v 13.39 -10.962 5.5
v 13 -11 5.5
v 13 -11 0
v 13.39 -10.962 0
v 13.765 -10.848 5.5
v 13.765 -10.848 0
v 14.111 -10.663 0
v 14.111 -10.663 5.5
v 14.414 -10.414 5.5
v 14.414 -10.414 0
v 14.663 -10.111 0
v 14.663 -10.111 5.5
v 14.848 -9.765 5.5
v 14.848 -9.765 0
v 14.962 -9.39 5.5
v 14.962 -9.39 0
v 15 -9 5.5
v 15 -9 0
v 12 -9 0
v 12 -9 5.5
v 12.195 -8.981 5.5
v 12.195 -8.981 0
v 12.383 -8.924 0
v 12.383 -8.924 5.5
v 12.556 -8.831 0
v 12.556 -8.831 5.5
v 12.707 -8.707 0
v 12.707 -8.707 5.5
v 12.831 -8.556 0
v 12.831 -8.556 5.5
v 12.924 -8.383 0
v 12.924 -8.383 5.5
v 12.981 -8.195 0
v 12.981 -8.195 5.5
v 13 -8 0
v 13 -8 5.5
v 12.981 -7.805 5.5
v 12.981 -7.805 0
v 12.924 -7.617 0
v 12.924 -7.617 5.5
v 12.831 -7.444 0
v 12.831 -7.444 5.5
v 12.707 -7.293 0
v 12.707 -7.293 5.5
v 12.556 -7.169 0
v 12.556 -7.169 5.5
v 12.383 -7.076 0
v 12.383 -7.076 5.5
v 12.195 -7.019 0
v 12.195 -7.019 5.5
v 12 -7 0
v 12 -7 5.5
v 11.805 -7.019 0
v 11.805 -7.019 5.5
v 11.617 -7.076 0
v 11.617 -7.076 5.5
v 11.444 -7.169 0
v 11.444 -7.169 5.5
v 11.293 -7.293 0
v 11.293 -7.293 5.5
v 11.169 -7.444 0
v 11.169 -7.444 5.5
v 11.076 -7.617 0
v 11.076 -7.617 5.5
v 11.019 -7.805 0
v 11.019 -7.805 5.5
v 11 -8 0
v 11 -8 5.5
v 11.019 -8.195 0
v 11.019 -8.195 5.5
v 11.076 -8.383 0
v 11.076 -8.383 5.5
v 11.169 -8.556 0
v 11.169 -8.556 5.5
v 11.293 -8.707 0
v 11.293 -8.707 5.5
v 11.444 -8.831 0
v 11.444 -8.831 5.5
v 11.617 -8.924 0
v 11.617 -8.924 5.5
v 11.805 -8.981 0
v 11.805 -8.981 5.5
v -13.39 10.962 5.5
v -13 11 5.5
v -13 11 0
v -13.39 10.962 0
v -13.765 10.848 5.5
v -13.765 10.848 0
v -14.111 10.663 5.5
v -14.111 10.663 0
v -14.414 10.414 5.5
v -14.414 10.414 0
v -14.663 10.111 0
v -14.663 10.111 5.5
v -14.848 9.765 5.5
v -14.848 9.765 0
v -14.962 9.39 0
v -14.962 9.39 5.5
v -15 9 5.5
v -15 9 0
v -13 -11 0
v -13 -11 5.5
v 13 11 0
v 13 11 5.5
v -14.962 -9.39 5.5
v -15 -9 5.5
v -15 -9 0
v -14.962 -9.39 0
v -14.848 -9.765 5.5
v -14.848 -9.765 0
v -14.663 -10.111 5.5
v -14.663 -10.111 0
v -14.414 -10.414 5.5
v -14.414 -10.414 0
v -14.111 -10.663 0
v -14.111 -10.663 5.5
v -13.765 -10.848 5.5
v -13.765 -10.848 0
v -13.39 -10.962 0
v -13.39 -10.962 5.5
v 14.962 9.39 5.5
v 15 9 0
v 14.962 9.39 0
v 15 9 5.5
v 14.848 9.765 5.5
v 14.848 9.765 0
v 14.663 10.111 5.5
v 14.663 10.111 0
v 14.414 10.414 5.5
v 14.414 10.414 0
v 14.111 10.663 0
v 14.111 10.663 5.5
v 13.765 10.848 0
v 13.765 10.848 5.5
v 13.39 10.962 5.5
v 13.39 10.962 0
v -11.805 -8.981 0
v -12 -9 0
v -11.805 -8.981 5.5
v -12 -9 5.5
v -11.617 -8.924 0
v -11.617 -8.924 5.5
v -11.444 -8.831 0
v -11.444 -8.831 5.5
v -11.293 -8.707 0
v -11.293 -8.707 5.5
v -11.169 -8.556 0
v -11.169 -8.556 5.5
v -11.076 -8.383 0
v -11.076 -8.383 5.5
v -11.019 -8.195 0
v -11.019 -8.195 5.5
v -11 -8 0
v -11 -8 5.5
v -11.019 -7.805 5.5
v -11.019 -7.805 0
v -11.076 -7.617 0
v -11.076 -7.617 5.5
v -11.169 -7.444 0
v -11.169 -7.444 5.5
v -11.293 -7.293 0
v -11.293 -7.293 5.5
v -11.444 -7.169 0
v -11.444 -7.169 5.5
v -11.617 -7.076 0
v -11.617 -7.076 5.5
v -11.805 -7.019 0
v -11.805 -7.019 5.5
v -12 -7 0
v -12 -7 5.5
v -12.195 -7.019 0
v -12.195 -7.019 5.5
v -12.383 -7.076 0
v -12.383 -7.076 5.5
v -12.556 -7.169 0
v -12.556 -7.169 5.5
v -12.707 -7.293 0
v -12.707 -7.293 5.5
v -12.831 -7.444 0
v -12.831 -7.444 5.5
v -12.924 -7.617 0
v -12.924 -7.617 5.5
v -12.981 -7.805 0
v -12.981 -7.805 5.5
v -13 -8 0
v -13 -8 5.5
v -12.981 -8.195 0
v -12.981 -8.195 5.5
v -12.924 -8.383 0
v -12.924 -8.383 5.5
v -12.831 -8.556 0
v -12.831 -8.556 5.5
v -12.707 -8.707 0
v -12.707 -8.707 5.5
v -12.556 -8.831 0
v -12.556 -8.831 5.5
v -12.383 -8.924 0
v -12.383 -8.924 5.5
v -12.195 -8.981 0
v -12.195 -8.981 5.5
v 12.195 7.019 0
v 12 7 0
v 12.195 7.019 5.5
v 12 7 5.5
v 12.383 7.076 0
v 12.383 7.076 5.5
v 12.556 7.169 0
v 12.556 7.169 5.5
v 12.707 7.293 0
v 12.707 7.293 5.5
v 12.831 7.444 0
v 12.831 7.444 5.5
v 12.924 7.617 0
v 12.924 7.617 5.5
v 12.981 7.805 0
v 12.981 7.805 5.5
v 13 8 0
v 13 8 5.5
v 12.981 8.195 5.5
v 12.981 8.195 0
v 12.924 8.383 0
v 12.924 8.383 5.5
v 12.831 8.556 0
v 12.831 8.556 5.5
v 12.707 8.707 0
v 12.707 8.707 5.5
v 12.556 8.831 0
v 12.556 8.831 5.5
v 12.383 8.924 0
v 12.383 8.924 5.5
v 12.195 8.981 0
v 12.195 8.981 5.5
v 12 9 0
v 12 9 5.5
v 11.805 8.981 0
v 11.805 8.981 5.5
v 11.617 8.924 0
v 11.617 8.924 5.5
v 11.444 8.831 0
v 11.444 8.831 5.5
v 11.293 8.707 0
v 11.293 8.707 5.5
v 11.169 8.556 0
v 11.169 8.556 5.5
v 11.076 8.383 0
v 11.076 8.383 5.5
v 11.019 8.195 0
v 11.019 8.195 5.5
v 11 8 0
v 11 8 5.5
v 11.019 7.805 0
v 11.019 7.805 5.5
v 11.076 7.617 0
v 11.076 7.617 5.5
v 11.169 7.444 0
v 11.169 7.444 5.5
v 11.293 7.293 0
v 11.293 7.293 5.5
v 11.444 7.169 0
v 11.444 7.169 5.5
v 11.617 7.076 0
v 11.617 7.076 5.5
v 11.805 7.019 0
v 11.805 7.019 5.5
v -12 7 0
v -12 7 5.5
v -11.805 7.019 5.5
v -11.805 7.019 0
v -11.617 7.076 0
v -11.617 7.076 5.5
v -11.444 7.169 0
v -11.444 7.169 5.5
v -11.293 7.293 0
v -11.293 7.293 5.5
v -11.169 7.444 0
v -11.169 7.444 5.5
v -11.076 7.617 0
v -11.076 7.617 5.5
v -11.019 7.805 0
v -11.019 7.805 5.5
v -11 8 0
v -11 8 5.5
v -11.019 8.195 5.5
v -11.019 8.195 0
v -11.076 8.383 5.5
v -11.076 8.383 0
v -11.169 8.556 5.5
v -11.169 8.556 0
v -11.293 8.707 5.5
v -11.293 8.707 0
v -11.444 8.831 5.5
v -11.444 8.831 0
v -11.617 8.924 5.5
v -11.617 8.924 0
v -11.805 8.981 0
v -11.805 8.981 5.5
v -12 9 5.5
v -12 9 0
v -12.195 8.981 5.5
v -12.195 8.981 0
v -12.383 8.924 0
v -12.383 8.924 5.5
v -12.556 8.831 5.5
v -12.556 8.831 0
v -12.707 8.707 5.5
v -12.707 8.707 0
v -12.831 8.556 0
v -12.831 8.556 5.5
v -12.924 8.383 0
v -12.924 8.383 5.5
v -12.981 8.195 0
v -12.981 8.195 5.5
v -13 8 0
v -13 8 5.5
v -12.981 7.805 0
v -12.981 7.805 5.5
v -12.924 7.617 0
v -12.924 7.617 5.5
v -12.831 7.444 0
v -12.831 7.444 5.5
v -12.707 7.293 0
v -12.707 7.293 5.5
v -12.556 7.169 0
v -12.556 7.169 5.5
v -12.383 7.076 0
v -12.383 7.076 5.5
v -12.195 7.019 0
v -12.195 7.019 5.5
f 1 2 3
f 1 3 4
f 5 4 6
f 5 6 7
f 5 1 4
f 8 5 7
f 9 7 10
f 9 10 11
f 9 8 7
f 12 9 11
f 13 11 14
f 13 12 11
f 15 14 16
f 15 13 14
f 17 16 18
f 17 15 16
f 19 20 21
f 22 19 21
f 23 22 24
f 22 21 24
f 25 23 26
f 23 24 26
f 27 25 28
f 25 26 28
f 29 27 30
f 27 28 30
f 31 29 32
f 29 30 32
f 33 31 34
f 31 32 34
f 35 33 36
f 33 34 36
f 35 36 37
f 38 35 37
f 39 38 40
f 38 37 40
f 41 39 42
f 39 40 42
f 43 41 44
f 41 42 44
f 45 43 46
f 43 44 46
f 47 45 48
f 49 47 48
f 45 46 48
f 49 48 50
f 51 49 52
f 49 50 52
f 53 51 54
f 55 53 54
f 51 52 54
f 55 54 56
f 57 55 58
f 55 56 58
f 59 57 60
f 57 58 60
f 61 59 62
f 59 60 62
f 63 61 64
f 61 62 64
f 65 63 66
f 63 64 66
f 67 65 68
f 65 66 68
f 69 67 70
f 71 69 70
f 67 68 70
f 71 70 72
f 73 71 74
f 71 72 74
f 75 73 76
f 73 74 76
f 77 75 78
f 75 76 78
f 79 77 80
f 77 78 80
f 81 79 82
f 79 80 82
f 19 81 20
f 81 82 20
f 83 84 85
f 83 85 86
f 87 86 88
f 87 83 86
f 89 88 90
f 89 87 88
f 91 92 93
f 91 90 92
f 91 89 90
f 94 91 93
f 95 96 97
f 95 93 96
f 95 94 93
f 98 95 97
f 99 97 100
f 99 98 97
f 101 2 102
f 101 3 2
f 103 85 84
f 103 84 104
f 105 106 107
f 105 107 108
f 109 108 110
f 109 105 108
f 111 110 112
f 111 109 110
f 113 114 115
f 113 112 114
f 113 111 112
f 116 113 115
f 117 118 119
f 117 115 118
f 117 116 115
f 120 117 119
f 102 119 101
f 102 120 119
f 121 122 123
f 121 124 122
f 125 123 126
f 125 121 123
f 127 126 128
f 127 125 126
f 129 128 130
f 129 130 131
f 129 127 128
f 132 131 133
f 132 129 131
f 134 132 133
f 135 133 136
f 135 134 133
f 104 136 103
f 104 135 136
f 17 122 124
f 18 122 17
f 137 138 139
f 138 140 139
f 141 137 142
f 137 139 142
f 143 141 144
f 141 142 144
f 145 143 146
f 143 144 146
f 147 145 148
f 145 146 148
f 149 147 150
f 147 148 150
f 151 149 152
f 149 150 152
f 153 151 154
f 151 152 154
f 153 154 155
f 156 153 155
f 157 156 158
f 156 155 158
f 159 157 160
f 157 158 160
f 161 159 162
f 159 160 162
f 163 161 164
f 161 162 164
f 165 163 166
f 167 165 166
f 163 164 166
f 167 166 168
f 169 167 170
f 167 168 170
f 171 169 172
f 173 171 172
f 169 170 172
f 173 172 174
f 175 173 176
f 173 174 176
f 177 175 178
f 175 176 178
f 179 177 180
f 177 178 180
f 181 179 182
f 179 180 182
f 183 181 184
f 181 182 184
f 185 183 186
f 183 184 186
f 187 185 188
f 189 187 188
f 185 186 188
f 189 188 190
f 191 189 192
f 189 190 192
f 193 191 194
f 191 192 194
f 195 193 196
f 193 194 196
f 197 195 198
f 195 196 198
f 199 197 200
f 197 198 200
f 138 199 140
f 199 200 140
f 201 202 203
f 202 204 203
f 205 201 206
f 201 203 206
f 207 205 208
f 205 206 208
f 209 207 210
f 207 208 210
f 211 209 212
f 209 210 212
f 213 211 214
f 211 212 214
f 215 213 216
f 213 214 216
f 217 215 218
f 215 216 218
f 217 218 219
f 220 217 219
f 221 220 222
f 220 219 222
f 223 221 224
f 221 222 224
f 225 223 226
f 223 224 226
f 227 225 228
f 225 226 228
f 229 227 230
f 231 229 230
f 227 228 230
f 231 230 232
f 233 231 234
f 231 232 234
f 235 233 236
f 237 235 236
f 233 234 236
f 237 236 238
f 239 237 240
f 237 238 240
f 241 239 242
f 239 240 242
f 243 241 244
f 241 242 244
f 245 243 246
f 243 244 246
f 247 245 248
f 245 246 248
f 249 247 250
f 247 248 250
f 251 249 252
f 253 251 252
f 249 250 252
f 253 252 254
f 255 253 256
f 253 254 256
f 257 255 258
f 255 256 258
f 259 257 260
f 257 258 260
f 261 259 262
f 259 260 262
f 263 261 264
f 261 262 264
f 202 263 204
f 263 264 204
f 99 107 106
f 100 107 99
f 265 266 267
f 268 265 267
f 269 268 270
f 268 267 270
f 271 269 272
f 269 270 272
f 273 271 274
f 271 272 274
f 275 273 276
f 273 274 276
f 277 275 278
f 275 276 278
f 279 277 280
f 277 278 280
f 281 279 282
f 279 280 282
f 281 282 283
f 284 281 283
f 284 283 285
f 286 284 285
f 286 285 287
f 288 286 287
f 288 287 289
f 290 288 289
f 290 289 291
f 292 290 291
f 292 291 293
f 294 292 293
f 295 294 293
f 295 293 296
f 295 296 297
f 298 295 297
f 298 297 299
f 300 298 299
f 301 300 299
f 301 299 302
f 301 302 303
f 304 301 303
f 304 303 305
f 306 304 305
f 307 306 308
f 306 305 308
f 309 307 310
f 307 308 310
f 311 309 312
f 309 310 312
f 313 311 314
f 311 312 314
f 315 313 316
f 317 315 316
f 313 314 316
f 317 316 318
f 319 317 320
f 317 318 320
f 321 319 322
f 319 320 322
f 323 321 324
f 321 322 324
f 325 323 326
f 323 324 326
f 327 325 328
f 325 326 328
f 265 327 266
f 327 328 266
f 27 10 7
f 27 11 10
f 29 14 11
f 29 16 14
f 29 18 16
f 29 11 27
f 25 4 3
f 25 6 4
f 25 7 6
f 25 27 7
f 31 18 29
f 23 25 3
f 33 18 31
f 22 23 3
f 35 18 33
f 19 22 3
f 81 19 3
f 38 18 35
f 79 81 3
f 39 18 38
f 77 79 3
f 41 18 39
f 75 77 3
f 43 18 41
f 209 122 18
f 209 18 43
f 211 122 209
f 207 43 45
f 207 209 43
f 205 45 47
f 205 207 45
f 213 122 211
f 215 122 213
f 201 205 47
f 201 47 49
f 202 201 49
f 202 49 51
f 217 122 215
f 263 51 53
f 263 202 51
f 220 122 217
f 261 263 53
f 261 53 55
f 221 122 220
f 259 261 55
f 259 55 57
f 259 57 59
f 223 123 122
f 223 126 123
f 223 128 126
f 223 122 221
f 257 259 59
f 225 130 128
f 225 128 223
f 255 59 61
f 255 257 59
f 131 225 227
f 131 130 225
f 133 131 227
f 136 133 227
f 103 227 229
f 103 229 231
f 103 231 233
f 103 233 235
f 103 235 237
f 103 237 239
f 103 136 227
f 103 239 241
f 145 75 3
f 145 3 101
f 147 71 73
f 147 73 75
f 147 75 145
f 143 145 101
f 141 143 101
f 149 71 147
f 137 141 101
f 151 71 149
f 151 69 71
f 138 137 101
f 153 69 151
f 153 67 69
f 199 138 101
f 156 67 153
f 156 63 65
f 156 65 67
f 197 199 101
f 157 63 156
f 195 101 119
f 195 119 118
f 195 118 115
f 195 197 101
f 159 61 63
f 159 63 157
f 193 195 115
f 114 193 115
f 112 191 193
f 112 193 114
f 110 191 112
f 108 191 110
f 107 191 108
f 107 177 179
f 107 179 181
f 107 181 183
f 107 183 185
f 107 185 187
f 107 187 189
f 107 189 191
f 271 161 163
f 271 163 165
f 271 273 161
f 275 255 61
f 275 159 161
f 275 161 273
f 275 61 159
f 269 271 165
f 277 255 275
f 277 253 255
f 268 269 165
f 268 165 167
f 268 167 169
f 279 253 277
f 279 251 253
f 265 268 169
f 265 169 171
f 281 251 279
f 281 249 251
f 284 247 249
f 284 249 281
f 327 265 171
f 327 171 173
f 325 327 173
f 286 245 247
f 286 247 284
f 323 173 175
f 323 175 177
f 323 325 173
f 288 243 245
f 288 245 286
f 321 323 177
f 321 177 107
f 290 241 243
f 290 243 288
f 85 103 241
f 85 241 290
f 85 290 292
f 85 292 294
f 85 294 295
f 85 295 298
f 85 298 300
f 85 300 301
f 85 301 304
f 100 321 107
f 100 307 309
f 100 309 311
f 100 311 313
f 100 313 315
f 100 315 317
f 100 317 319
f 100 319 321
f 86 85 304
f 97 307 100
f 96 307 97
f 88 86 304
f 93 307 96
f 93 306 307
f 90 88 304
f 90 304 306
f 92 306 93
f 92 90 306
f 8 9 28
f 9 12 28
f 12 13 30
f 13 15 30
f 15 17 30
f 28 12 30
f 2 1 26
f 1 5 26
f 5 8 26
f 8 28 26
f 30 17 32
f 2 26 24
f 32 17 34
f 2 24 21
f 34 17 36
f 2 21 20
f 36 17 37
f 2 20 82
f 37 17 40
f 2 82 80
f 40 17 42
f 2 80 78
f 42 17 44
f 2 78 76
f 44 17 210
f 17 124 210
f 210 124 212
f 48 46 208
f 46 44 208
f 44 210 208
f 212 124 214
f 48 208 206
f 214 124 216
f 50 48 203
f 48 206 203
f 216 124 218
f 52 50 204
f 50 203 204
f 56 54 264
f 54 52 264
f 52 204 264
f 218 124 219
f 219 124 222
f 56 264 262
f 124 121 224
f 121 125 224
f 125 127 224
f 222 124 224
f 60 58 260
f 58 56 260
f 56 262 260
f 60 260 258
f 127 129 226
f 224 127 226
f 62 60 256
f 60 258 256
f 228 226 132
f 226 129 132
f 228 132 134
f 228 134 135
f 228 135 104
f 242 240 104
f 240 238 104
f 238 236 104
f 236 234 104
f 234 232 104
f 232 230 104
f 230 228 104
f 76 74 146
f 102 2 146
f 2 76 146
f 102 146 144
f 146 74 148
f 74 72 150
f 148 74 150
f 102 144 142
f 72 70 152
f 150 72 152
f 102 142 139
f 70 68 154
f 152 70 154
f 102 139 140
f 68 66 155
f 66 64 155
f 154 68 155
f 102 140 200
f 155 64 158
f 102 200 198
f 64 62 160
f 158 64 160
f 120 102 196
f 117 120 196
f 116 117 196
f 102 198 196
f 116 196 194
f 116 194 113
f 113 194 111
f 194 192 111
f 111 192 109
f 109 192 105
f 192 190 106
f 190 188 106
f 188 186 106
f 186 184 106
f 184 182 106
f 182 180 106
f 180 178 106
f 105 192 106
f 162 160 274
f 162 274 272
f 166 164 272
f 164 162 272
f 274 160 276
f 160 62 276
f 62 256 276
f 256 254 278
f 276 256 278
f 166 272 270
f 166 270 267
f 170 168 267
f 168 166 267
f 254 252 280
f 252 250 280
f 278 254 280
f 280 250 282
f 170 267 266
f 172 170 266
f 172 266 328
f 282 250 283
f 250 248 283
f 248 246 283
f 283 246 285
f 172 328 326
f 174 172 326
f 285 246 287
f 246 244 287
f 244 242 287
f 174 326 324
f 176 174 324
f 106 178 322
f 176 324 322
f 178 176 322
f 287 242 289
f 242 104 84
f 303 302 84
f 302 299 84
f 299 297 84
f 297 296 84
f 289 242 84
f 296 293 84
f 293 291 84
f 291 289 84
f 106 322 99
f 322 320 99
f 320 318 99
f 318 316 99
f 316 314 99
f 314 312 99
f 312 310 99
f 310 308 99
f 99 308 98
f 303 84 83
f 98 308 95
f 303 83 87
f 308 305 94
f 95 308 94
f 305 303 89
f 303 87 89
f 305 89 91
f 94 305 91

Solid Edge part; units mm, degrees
sketch "Sketch1" plane through (0, 0, 0) normal (0, 0, 1) x (1, 0, 0)
  line L0 (15, -11) -> (-15, -11)
  line L1 (-15, -11) -> (-15, 11)
  line L2 (-15, 11) -> (15, 11)
  line L3 (15, 11) -> (15, -11)
  dimension "D1" = 30
  dimension "D2" = 22
extrude "Protrusion1" add sketch "Sketch1" along normal blind 5.5
hole "Hole_1" at (12, 8, 5.5) direction (0, 0, -1) diameter 2 end through all
hole "Hole1" at (12, -8, 5.5) direction (0, 0, -1) diameter 2 end through all
hole "Hole2" at (-12, 8, 5.5) direction (0, 0, -1) diameter 2 end through all
hole "Hole3" at (-12, -8, 5.5) direction (0, 0, -1) diameter 2 end through all
fillet "Round_1" radius 2 3 edges at (-15, 11, 2.75) (-15, -11, 2.75) (15, -11, 2.75)
fillet "Round_2" radius 2 1 edges at (15, 11, 2.75)
properties material "木材, アッシュ"
